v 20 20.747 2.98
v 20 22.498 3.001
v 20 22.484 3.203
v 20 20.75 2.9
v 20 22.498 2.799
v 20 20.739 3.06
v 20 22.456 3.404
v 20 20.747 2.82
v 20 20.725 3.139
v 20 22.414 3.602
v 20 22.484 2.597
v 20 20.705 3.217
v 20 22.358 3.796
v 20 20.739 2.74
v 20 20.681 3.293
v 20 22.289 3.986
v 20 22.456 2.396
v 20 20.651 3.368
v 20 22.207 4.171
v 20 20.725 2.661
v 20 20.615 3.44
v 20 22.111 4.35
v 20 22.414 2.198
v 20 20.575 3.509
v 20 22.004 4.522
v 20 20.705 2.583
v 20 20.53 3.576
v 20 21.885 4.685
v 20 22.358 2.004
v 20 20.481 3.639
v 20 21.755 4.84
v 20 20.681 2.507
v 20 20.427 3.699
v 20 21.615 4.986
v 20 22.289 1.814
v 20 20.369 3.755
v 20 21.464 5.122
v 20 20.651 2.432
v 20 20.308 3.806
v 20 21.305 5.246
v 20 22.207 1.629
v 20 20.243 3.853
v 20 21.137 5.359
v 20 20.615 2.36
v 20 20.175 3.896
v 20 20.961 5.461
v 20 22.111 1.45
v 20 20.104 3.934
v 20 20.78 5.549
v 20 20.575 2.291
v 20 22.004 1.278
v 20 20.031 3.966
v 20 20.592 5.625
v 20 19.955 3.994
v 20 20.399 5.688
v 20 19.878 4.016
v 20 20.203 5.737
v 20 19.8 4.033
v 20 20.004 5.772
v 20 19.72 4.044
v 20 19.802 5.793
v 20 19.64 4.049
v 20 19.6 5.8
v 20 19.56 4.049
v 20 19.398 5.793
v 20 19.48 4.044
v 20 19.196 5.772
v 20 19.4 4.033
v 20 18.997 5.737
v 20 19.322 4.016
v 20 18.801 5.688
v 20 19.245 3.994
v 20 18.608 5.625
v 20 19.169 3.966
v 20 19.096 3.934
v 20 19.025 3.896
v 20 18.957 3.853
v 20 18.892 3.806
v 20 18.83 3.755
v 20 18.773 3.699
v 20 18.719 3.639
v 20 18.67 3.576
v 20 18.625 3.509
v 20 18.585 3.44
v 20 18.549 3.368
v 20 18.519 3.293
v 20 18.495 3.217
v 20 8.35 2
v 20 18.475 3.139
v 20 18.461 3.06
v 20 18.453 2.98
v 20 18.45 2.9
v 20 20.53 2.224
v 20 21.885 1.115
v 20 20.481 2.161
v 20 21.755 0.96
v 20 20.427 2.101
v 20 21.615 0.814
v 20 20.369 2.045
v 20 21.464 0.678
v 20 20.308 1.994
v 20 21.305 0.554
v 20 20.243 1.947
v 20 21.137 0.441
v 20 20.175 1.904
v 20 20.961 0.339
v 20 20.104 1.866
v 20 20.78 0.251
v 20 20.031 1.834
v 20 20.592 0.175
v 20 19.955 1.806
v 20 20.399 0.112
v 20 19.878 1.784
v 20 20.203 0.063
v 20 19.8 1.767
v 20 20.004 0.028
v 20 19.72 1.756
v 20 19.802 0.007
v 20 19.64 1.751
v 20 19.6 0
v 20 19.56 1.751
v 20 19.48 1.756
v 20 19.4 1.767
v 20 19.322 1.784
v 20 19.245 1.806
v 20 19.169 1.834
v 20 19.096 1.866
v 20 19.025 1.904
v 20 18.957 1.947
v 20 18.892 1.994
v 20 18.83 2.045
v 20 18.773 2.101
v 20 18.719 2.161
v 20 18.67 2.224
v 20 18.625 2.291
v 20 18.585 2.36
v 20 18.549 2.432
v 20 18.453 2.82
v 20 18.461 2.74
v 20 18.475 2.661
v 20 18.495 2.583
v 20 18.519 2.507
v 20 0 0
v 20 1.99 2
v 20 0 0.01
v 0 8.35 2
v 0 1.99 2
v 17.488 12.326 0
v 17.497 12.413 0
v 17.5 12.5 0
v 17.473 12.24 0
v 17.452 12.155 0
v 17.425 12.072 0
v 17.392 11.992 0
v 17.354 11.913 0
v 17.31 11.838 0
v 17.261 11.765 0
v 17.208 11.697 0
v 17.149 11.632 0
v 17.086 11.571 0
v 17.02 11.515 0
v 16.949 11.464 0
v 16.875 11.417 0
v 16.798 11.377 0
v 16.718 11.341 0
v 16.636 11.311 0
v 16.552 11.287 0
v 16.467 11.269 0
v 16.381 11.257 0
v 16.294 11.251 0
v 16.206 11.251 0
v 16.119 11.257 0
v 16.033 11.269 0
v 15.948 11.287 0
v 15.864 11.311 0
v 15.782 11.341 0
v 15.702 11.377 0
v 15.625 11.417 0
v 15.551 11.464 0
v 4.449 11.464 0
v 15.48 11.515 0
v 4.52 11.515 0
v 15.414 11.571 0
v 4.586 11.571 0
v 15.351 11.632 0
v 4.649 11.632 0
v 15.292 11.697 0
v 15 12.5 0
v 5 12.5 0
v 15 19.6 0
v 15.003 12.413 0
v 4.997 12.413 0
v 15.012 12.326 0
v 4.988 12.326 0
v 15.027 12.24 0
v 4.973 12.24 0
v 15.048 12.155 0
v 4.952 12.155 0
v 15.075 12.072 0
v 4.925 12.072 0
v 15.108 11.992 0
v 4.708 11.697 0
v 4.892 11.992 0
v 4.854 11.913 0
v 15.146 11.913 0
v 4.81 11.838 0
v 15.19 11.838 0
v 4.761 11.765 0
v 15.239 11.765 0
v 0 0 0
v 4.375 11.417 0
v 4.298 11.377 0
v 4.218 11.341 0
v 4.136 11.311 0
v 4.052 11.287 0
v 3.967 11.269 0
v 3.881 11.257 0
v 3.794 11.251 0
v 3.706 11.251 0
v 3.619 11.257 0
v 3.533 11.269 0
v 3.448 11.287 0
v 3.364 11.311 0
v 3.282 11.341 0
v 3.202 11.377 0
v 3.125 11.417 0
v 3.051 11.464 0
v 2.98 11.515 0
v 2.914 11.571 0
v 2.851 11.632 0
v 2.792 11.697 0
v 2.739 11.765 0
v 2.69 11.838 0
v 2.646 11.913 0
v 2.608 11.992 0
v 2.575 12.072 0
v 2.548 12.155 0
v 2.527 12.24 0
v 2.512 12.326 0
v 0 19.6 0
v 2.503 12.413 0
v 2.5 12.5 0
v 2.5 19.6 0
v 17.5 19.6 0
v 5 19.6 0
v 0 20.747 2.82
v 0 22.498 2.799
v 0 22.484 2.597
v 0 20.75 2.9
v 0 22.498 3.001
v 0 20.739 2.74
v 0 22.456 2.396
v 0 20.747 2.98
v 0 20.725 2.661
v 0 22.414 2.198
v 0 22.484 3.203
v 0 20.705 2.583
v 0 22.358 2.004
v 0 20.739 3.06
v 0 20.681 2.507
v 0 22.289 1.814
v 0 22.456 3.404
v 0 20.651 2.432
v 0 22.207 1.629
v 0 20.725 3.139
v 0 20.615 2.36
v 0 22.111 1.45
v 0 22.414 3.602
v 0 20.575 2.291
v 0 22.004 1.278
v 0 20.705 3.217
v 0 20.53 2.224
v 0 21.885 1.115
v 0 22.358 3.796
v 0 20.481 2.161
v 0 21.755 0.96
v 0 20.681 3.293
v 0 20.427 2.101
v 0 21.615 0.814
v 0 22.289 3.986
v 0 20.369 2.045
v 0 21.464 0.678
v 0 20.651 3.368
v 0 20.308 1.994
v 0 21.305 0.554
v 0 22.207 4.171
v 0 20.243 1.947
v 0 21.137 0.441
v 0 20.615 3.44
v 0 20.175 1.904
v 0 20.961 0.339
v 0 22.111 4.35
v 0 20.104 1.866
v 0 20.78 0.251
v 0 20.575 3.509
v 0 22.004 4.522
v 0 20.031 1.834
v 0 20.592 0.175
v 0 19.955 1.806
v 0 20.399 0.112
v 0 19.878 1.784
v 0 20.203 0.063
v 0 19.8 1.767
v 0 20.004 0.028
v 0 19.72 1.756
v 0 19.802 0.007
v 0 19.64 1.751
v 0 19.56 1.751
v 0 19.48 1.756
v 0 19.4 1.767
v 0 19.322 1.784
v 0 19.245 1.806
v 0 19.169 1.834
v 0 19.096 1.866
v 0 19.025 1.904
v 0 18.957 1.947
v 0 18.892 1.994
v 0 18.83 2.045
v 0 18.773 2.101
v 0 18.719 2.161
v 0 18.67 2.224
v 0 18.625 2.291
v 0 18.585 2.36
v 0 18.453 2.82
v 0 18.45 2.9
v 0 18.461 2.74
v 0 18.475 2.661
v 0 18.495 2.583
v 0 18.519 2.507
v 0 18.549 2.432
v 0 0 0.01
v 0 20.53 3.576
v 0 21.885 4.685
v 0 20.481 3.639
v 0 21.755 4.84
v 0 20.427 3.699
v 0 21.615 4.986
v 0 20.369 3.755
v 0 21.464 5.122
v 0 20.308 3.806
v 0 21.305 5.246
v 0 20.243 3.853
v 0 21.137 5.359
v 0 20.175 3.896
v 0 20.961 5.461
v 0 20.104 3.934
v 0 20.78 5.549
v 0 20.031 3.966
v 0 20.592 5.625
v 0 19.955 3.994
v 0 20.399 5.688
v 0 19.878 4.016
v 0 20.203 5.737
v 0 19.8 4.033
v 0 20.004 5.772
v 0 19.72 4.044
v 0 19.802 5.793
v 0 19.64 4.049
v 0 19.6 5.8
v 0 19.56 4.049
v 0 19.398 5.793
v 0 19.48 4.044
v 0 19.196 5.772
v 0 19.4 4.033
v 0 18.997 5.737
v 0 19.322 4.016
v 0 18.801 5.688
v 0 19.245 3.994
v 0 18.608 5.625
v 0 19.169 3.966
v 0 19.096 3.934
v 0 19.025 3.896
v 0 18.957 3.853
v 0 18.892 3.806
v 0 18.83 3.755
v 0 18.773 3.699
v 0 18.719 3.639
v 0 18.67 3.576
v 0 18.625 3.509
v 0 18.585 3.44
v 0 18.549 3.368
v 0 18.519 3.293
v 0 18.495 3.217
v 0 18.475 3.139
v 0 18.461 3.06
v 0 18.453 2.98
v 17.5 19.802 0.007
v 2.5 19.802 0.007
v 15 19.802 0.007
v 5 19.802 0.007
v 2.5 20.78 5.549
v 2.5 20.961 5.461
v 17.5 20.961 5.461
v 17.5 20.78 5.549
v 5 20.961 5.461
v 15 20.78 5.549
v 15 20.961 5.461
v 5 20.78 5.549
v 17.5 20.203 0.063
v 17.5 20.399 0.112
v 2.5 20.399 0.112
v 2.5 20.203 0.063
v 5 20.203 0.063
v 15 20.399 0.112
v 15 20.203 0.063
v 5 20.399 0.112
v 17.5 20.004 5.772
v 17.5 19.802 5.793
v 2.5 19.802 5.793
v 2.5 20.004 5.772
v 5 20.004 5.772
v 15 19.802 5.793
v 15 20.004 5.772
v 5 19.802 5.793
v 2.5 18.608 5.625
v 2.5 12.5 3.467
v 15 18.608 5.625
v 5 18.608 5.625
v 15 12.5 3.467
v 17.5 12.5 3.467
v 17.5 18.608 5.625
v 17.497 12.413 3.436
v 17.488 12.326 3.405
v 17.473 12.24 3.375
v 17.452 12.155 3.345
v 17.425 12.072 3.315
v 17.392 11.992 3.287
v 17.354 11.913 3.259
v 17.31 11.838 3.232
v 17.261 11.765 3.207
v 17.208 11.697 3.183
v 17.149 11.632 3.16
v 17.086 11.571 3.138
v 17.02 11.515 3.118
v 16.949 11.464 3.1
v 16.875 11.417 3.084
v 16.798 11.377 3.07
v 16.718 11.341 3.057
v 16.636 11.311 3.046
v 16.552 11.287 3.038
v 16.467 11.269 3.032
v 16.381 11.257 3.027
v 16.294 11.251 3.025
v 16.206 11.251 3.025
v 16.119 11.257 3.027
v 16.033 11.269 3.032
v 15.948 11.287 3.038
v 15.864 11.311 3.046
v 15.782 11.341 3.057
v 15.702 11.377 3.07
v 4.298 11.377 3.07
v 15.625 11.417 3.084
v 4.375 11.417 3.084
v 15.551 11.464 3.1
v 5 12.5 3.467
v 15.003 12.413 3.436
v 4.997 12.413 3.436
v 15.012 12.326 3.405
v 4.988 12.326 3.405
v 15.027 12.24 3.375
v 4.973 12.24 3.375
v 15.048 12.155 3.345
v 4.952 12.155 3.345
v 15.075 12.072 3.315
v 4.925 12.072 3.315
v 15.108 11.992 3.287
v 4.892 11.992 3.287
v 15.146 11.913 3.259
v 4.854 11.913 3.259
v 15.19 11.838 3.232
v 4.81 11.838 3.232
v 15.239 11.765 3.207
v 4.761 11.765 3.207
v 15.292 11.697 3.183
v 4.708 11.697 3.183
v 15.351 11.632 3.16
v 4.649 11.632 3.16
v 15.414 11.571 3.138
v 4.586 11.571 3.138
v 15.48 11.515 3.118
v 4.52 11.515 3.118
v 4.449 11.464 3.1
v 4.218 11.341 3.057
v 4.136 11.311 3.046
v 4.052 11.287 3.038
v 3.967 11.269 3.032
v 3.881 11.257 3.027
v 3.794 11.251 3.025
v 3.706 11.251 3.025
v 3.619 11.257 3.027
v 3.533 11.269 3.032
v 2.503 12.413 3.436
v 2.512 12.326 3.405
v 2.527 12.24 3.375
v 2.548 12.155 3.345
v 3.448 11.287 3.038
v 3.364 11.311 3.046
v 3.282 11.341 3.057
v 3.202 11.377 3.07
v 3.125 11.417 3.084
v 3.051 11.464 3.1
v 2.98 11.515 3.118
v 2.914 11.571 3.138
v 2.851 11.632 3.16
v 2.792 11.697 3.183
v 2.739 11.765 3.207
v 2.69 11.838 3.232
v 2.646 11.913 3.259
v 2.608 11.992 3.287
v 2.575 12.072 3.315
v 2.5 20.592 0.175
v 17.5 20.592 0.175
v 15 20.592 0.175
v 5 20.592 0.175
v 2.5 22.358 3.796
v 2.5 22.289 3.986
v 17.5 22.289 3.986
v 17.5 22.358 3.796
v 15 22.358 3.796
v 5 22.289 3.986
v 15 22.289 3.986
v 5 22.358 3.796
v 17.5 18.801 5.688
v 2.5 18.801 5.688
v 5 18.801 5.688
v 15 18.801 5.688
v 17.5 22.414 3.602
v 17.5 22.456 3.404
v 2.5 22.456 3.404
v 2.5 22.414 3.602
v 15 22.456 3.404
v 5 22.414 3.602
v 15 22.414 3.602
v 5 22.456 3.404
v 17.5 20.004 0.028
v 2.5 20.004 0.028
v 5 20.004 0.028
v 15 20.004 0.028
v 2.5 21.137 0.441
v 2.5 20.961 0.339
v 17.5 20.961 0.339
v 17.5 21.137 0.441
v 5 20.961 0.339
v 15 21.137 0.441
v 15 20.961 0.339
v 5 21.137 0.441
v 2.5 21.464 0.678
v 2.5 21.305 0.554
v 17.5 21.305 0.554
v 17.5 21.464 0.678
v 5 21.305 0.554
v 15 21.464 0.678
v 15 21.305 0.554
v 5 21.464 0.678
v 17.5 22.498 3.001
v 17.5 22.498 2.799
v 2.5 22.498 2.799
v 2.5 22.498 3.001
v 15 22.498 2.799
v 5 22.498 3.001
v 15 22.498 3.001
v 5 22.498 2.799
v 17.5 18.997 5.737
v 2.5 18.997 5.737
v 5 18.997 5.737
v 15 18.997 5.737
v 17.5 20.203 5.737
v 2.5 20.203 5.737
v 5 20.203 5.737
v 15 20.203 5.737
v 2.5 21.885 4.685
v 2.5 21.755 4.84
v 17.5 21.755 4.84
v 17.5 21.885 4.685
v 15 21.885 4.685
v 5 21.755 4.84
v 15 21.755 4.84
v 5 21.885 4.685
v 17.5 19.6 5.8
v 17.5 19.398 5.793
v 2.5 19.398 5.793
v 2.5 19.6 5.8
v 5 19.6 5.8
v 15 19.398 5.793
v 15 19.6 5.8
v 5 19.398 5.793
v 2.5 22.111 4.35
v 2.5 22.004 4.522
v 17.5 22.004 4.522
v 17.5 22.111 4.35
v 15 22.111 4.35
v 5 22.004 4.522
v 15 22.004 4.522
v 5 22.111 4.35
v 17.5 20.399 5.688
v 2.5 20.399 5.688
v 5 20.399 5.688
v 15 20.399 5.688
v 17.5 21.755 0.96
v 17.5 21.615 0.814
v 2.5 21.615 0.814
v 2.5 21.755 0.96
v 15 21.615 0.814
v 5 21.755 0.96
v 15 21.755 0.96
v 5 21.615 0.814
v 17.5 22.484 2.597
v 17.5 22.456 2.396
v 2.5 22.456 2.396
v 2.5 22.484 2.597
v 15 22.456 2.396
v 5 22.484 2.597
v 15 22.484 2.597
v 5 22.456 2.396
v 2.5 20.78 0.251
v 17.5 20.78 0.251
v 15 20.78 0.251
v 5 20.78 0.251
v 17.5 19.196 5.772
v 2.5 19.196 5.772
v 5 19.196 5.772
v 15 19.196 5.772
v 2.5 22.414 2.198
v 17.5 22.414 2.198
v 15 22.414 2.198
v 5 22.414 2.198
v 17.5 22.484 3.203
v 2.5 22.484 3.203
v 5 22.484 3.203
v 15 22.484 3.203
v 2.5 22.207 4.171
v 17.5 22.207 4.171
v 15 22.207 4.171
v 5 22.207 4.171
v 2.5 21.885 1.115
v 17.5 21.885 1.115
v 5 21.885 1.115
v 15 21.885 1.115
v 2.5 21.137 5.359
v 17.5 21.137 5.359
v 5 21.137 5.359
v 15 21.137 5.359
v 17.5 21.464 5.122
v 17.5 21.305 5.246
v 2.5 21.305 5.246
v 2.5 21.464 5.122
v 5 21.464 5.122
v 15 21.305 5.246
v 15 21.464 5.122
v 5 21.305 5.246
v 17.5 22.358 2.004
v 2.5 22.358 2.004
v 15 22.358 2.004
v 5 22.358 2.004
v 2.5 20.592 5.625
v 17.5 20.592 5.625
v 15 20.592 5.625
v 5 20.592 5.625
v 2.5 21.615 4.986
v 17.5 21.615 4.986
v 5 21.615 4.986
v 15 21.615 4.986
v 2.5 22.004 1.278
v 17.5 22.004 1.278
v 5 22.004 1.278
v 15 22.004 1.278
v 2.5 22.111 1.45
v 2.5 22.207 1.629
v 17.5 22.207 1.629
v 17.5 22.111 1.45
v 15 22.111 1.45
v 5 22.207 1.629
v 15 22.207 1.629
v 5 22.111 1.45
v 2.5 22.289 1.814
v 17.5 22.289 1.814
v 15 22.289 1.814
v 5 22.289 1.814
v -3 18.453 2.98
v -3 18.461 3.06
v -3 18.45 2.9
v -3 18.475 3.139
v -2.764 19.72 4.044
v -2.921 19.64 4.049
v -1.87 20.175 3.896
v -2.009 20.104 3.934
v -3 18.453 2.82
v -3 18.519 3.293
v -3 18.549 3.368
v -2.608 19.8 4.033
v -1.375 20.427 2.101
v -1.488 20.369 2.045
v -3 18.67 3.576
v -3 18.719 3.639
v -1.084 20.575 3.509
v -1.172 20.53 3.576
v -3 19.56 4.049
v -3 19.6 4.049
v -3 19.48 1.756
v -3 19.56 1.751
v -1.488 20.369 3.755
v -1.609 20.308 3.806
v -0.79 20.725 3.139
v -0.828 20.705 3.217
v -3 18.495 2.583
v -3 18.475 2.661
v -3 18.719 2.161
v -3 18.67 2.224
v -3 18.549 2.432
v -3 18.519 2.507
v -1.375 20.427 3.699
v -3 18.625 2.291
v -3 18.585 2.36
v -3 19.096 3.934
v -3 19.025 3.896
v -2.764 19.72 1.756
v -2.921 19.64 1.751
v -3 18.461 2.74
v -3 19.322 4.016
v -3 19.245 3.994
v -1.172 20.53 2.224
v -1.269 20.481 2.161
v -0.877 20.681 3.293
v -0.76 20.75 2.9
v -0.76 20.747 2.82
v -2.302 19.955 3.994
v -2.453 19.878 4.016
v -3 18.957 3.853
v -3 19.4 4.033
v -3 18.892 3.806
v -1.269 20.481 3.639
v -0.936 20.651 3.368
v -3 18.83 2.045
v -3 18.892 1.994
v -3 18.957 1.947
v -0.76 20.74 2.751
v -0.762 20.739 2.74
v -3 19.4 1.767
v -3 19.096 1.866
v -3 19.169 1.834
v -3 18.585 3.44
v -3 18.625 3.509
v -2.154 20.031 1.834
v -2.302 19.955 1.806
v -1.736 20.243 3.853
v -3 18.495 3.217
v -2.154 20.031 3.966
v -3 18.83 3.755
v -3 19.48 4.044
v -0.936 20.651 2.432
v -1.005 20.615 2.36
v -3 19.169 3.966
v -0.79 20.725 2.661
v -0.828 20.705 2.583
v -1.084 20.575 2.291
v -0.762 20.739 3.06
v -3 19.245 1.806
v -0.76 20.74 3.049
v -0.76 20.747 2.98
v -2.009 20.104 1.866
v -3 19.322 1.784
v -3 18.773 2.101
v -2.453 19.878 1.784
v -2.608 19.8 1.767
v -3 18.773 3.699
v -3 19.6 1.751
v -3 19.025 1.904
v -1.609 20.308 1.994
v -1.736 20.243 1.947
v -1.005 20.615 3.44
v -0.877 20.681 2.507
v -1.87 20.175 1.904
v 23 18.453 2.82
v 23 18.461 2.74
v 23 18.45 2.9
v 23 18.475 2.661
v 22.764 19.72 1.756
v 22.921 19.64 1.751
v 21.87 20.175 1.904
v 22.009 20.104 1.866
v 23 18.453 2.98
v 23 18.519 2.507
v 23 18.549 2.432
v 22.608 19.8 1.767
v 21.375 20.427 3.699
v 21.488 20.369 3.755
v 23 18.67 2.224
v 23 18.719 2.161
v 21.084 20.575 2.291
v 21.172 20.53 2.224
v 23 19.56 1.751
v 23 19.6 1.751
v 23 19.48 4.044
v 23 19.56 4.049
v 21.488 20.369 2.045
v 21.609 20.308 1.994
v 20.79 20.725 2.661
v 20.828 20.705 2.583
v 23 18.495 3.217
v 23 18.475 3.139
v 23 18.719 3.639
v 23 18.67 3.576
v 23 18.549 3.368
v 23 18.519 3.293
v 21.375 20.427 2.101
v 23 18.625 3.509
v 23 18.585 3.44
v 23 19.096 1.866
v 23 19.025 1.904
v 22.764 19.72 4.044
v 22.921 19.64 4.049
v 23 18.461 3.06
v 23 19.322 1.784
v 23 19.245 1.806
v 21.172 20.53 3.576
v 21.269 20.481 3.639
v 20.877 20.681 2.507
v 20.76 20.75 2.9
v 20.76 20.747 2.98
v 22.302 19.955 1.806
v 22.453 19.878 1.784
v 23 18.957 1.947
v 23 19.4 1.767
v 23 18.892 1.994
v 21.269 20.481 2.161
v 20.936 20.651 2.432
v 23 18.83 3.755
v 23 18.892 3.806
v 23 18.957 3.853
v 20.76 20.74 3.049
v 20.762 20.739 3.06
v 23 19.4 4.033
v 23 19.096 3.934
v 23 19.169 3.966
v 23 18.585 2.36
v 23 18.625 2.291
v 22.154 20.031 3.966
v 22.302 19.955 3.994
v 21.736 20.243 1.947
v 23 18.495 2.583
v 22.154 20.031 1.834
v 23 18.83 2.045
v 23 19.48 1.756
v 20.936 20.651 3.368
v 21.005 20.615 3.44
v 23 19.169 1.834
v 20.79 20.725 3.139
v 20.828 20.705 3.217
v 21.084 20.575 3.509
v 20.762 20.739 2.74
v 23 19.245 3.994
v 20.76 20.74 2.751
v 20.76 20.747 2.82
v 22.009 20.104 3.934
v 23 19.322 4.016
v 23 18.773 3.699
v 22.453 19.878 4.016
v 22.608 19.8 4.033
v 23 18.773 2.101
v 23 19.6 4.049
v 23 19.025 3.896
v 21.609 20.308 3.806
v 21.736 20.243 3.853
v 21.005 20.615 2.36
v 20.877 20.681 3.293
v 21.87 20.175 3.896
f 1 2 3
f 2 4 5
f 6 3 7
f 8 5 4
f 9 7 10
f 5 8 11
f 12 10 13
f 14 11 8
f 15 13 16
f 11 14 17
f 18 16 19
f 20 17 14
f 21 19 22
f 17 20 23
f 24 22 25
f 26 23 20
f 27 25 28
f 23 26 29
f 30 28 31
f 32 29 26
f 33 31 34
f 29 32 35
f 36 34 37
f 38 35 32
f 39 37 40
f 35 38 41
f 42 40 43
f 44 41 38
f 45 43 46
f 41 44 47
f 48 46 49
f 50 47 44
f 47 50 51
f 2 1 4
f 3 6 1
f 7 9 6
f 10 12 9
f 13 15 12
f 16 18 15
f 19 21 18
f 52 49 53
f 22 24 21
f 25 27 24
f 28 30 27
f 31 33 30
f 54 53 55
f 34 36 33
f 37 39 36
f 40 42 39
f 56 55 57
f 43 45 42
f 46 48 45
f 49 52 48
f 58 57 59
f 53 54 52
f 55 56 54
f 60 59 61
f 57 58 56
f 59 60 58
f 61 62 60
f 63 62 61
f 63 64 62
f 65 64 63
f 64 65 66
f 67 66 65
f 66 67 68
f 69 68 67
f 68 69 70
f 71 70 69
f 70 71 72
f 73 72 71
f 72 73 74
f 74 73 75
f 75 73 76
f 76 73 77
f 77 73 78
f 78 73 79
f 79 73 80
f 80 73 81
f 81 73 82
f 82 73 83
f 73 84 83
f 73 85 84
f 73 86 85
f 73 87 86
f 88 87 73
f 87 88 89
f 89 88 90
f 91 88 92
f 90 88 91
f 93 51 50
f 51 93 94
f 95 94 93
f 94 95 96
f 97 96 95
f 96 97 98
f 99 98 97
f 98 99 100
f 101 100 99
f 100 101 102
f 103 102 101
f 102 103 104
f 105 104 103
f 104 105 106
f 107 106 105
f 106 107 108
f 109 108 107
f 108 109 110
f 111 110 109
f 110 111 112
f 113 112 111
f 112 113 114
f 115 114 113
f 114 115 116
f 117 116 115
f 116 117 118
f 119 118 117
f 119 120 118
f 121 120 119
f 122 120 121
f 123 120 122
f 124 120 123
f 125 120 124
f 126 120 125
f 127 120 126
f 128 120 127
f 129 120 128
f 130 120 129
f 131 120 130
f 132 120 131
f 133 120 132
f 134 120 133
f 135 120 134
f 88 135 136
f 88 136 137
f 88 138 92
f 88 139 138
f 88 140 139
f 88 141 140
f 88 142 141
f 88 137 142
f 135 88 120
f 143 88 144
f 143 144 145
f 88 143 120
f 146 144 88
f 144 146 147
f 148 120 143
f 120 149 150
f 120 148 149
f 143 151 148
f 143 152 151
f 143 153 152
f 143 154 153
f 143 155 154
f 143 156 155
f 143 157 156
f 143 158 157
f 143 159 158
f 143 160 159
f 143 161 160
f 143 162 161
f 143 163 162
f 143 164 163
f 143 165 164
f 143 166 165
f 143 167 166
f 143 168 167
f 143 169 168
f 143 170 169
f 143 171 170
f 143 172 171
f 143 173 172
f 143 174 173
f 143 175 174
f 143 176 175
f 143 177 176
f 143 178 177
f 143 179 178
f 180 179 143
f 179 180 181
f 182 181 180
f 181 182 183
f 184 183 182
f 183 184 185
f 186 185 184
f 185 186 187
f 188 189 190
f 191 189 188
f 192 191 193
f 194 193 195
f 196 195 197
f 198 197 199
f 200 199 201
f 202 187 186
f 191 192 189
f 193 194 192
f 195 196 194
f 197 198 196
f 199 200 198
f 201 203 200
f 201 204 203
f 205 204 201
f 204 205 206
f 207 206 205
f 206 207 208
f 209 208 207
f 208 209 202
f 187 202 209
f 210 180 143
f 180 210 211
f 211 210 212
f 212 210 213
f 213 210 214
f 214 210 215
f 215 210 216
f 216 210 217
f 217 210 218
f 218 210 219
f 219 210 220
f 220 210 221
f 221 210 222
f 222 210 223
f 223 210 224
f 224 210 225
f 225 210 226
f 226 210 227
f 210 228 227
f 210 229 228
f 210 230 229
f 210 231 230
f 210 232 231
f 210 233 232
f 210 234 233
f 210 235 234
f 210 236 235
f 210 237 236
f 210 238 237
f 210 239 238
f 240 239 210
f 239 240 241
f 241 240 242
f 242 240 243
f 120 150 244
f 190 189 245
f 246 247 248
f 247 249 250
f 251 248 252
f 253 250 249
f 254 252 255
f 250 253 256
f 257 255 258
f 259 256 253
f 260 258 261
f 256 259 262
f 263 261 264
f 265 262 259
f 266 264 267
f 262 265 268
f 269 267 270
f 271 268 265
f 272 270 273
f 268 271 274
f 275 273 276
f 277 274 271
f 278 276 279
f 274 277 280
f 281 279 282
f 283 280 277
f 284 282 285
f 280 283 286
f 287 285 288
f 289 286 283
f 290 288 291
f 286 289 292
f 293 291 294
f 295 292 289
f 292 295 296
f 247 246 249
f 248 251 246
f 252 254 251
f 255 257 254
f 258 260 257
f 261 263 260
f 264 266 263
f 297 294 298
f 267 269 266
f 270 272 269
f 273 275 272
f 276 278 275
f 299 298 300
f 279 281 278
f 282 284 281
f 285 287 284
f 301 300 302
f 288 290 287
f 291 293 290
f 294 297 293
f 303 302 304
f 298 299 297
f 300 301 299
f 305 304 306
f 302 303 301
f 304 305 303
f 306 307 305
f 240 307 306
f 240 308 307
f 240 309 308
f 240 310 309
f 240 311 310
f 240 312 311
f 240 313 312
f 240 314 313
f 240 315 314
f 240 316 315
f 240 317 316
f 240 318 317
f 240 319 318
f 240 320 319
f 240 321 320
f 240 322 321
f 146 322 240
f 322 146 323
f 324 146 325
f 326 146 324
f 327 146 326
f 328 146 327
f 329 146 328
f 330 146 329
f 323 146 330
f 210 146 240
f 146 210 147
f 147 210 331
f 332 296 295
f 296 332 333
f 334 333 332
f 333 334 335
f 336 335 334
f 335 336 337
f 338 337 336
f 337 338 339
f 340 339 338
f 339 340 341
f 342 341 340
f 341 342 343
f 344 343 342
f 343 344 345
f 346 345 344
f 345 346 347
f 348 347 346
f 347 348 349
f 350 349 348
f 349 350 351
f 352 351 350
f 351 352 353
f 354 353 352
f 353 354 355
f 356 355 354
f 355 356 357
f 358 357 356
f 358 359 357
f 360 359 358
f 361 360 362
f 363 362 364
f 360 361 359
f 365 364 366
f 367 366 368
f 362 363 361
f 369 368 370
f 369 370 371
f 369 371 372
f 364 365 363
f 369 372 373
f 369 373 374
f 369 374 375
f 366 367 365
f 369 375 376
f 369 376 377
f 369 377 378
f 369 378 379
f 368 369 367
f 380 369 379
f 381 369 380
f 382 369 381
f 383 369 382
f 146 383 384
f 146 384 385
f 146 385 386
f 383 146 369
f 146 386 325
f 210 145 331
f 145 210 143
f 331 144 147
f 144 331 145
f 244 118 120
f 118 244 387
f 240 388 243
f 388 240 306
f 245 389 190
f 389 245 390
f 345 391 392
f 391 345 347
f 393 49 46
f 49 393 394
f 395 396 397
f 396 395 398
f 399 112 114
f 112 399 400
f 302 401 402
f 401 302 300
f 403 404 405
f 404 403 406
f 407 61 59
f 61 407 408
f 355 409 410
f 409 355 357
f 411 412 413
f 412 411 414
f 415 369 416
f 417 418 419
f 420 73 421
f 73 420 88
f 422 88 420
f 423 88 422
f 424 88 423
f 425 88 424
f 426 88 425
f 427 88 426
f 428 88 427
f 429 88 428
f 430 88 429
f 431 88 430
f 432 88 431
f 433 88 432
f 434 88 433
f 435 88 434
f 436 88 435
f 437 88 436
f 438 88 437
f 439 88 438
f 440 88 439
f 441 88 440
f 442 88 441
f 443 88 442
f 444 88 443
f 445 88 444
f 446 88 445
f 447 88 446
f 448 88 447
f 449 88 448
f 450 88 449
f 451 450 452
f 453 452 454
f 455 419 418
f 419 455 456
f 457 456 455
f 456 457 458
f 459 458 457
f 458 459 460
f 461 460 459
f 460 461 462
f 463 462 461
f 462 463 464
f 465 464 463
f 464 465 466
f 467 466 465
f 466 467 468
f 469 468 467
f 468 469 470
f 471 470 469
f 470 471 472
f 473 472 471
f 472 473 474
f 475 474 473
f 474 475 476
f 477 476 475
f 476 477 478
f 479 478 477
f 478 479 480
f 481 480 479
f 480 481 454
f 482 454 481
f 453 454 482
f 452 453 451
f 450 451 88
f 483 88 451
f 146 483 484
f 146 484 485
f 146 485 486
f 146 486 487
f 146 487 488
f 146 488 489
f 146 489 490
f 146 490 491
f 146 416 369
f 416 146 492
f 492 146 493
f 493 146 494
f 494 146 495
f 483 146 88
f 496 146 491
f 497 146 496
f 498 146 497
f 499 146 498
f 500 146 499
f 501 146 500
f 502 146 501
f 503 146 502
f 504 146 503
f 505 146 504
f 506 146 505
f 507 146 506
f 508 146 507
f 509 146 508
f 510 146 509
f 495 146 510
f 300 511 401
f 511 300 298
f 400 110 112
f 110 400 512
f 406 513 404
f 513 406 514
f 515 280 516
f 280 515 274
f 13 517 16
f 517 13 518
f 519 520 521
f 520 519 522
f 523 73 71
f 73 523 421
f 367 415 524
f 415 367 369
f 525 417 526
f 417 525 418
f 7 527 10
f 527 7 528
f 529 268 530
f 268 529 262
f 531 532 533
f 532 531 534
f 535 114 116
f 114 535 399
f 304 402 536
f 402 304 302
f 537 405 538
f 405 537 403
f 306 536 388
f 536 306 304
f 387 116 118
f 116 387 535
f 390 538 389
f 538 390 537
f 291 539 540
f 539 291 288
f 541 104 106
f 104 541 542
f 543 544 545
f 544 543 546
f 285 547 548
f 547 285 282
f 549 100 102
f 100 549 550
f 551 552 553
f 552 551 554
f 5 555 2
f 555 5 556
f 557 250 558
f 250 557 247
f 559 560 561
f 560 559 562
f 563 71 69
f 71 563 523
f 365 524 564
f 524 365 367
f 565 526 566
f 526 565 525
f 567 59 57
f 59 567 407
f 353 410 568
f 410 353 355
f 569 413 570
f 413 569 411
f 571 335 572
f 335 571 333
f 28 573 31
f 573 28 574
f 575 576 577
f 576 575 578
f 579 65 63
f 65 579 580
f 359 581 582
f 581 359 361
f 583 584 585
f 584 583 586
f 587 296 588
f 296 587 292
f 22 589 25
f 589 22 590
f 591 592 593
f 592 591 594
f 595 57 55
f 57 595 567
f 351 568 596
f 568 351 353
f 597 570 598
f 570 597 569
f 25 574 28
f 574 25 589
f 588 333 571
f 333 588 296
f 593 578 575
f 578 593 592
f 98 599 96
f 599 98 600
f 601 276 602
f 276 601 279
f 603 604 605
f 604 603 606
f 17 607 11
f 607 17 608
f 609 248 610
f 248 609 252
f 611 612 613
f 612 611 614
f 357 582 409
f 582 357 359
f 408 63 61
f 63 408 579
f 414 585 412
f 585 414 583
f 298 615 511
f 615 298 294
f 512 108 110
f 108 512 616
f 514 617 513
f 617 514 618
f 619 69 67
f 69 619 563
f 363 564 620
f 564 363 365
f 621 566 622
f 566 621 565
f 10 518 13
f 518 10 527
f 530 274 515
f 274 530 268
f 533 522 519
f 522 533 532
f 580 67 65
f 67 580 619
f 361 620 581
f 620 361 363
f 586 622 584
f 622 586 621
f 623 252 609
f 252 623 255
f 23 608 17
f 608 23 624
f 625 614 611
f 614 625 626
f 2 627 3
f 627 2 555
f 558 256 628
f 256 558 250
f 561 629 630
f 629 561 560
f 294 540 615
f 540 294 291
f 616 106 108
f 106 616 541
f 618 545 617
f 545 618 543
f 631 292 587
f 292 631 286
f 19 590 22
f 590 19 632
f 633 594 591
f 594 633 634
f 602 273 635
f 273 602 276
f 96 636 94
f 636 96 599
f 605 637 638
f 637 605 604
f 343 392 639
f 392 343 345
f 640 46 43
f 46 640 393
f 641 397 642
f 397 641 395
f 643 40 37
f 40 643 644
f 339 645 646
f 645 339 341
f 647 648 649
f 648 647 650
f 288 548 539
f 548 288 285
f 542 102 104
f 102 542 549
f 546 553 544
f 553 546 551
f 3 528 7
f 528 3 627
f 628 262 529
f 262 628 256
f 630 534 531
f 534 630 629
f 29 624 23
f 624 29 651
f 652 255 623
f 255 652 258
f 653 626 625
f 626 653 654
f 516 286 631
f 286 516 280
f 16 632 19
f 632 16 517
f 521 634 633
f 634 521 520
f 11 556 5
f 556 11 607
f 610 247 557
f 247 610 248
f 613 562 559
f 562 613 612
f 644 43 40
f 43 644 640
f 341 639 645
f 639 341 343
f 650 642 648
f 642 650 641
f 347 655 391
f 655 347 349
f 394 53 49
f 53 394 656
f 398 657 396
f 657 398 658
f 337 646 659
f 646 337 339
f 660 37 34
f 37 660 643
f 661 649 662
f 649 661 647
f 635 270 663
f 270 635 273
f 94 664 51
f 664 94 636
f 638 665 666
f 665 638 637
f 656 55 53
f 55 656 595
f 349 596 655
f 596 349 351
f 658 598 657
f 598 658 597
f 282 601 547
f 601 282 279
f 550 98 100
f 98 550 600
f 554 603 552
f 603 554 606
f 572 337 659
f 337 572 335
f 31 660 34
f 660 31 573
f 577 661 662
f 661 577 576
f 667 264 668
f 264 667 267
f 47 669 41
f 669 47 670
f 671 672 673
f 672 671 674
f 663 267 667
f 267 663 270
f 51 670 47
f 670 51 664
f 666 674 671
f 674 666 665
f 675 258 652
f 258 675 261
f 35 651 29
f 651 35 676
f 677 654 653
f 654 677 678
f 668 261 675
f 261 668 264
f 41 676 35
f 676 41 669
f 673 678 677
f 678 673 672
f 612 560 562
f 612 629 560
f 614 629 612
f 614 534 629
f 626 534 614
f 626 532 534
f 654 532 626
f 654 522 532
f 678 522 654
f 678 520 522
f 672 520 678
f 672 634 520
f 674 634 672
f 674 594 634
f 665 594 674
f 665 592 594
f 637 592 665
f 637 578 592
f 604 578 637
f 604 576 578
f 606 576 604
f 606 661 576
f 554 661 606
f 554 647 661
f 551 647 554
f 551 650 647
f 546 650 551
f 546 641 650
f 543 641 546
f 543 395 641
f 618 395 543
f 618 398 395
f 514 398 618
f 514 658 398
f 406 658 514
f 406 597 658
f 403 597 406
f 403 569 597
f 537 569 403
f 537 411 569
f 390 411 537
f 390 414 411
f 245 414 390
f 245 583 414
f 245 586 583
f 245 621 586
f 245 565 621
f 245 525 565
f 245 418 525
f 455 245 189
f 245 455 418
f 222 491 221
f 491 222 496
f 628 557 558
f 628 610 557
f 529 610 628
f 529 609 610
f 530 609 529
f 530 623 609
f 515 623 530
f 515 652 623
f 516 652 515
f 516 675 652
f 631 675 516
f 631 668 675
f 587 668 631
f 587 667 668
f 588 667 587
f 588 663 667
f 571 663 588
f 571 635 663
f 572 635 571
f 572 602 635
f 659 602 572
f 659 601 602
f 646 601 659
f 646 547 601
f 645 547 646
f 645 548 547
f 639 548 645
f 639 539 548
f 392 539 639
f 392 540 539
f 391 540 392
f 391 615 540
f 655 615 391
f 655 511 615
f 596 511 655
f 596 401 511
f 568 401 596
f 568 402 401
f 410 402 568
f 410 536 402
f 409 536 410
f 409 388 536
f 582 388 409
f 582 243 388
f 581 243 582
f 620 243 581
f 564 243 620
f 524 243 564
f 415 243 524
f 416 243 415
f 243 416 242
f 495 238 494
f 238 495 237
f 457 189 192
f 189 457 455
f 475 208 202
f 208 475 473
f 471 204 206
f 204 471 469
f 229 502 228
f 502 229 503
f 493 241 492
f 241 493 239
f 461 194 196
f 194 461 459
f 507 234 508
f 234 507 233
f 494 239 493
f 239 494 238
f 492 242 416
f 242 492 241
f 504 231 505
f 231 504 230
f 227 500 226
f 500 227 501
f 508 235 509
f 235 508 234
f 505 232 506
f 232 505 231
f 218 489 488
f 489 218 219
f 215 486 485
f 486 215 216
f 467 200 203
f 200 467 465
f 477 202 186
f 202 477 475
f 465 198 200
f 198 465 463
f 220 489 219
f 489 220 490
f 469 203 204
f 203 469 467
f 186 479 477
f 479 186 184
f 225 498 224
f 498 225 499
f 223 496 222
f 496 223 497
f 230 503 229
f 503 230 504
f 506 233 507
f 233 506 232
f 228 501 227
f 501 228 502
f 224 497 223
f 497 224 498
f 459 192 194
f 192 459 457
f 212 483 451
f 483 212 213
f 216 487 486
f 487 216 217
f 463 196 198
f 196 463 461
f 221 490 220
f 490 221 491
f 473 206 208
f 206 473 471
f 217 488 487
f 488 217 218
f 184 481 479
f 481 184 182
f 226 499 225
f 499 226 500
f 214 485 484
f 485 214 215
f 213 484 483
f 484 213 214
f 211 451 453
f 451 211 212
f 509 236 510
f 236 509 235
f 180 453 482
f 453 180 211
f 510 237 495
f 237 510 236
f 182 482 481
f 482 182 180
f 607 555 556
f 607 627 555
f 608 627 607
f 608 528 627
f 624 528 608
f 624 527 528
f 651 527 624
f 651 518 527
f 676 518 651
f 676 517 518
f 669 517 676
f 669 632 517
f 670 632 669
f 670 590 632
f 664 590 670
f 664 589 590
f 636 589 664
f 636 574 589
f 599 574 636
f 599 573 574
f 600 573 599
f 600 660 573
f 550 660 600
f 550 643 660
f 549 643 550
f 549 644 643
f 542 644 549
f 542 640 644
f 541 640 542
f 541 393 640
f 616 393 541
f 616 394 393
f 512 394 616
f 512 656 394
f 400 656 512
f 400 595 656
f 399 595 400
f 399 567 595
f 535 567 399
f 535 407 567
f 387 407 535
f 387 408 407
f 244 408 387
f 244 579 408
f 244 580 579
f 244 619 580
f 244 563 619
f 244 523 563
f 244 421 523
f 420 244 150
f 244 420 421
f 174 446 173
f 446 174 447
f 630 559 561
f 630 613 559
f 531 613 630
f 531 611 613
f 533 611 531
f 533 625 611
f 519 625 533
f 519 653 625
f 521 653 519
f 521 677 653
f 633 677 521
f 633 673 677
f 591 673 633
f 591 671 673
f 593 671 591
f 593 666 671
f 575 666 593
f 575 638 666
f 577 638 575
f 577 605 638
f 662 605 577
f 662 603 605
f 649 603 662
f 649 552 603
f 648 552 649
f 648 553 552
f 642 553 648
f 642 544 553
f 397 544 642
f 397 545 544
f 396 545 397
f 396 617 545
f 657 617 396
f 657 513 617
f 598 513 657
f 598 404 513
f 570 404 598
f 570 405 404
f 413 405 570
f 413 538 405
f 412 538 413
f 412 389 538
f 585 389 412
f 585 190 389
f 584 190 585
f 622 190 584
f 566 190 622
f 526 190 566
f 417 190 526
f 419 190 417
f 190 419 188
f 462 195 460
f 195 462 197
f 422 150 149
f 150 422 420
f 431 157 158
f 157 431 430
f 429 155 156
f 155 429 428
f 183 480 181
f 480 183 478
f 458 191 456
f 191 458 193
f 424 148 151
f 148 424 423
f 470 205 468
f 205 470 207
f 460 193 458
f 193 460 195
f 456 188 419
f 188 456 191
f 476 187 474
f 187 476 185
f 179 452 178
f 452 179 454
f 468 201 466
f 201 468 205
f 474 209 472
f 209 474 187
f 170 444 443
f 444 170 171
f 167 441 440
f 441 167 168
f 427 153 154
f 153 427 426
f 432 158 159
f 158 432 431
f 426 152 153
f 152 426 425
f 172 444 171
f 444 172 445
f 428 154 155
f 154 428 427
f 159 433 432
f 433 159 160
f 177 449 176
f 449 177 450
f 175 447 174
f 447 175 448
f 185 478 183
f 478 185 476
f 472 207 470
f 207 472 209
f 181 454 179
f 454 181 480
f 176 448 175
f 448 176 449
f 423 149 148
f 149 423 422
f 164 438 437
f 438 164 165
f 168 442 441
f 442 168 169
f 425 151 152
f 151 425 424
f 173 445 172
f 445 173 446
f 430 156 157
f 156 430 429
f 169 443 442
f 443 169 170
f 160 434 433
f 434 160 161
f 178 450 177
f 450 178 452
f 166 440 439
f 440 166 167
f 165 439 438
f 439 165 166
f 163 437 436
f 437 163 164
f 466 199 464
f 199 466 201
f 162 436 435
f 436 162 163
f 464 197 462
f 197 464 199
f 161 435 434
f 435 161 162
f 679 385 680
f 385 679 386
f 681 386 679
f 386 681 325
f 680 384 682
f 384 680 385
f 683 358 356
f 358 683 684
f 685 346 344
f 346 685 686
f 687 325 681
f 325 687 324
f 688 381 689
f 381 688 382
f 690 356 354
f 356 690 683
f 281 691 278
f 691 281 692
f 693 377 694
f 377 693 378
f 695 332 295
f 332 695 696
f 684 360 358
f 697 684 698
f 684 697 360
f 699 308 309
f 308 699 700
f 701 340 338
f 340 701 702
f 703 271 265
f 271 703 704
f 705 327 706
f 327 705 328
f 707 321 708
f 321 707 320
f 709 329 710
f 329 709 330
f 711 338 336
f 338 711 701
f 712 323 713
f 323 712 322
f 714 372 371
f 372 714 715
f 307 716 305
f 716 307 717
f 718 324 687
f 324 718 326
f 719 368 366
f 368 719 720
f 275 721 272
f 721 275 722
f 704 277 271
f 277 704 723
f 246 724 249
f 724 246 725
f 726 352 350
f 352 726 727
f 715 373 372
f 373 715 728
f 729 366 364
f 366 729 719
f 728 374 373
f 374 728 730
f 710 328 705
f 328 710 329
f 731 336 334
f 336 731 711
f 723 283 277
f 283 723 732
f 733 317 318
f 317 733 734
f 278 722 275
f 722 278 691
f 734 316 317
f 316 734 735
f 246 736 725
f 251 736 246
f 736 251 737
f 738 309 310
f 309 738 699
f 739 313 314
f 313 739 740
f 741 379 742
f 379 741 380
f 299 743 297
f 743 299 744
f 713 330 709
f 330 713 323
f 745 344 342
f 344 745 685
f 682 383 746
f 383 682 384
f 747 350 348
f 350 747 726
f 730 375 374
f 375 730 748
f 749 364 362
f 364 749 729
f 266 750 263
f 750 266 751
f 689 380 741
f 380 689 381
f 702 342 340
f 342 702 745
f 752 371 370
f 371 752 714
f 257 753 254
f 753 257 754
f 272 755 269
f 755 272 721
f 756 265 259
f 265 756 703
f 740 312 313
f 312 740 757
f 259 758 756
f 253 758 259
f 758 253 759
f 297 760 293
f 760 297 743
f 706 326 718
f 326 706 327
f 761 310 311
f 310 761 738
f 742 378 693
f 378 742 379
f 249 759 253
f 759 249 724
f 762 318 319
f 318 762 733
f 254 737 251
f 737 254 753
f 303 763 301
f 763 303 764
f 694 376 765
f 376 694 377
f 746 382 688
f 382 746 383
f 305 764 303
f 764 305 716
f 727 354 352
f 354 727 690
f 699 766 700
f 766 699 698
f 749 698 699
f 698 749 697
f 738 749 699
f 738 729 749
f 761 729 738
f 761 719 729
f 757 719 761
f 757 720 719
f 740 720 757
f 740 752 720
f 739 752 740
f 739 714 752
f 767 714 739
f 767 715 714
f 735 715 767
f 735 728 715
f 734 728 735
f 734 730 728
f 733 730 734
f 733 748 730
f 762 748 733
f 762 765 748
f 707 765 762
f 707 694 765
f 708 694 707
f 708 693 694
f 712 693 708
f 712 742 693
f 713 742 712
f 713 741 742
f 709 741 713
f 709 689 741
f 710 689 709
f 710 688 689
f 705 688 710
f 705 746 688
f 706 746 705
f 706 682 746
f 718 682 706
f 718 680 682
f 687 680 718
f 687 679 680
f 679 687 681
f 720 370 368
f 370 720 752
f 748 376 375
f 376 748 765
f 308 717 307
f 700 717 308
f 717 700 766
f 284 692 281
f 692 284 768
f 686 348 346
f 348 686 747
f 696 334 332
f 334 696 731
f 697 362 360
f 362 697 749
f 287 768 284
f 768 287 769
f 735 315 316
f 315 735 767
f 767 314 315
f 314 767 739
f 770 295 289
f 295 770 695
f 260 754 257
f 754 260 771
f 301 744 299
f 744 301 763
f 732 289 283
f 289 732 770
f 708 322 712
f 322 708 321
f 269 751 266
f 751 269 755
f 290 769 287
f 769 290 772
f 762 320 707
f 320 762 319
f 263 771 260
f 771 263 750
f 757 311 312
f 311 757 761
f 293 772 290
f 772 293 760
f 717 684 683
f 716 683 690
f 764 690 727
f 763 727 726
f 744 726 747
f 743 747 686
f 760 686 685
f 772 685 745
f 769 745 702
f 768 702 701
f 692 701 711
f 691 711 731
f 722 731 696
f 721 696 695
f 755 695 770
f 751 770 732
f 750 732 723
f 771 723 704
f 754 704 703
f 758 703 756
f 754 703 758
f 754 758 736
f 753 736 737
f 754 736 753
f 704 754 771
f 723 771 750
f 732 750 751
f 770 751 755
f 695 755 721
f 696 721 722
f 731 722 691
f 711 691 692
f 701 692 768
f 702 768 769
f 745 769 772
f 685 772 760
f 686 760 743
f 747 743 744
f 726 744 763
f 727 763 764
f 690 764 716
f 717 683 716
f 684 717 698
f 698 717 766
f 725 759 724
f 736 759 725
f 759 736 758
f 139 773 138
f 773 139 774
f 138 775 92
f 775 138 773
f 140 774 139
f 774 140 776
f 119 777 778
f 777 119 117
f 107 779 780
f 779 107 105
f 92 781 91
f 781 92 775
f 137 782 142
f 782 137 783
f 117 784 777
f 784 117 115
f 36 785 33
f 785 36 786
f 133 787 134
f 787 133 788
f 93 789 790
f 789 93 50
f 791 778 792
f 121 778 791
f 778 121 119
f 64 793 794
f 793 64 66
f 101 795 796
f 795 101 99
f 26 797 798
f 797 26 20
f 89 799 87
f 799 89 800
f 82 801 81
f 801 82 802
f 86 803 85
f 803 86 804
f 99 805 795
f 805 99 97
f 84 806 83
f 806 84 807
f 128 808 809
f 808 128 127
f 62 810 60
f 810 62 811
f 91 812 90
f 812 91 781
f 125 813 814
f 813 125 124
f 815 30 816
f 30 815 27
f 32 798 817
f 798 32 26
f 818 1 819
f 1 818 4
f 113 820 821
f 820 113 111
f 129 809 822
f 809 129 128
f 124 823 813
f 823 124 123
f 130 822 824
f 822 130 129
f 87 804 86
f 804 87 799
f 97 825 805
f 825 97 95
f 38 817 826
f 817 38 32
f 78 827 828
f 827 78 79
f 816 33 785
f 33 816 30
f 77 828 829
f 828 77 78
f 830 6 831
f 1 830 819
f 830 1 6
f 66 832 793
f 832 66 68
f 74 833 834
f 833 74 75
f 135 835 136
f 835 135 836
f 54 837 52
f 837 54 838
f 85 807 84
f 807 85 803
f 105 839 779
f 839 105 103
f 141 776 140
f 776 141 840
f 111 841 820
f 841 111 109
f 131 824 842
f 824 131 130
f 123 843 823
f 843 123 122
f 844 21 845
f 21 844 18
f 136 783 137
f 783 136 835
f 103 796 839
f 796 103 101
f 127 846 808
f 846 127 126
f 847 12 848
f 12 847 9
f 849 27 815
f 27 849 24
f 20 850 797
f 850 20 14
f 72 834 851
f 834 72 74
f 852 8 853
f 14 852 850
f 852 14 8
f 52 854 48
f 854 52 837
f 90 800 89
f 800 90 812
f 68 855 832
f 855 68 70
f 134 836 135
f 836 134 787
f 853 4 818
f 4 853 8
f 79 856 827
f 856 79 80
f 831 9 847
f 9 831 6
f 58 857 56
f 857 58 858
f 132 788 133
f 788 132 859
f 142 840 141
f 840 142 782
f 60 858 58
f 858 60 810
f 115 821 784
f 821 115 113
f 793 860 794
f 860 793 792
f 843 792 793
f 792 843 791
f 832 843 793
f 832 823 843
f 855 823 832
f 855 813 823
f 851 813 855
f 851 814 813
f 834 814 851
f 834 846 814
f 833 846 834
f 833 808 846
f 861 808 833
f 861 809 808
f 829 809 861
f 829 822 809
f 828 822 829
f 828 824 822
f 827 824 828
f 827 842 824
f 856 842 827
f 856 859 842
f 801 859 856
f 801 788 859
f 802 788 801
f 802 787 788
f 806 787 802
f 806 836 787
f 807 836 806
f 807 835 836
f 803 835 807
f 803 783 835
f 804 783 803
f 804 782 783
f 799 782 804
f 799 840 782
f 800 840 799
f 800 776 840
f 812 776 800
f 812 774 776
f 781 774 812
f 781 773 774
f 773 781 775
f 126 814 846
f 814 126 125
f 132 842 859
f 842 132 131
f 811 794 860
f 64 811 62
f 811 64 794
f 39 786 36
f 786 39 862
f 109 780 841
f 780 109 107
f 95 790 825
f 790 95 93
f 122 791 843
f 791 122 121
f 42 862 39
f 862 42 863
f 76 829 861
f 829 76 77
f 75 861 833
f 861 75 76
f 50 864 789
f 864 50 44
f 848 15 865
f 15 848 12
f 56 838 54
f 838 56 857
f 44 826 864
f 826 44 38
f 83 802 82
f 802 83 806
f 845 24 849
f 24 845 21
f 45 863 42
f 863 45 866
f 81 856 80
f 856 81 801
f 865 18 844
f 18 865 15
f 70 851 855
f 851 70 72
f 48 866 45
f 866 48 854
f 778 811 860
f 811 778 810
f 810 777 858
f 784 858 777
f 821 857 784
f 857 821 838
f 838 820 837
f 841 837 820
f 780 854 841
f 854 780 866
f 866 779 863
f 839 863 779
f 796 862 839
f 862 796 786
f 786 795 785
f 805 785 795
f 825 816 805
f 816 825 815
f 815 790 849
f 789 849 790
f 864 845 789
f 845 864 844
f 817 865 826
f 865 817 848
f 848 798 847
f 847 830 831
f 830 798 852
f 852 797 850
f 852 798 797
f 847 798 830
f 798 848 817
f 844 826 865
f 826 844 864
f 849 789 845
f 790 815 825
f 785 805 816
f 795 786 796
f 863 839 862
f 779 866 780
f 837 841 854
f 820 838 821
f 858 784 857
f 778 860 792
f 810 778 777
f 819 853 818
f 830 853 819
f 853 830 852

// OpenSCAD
// general purpose parameters
eps = 0.01;
$fn = 90;

// main shape parameters
kl_d = 5.8;
kl_x = 20;
kl_y = 22.5;
kl_t = 2;

// cut parameters
// cut width
c_w = 2.5;
// cut lenfth
c_l = 10;

// hinge parameters
h_h = 3;
h_d = 2.3;

module cut()
{
    hull()
    {
        cylinder(h=kl_d+2*eps,d=c_w);
        translate([0,c_l,0])
            cylinder(h=kl_d+2*eps,d=c_w);
    }
}
    

module hinge()
{
    difference()
    {
        cylinder(d=h_d,h=h_h);
        translate([-h_d/2,-h_d/2,h_h/4+eps])
        hull()
        {
            cube([eps,h_d,3*h_h/4]);
            translate([0,0,3*h_h/4-eps])
                cube([h_d/2,h_d,eps]);
        }
    }
}


module keyboard_leg()
{
    difference()
    {
        union()
        {
            // main shape
            translate([0,kl_t,0])
                cube([kl_x,kl_y-kl_t-kl_d/2,kl_t]);
            // front slope
            hull()
            {
                cube([kl_x,kl_t,eps]);
                translate([0,kl_t-eps,0])
                    cube([kl_x,eps,kl_t]);
            }
            // back area
            hull()
            {
                translate([0,kl_y-kl_d/2,kl_d/2])
                    rotate([0,90,0])
                        cylinder(d=kl_d,h=kl_x);
                translate([0,kl_y/2-kl_d/2,0])
                    cube([kl_x,kl_y/2-kl_d/2,kl_t]);
            }
        }
        
        // springing cut
        translate([1.5*c_w,kl_y-c_l,-eps])
            cut();
        translate([kl_x-1.5*c_w,kl_y-c_l,-eps])
            cut();
            
    }
    // adding side cylinders
    translate([0,kl_y-kl_d/2,kl_d/2])
        rotate([90,0,-90])
            hinge();
    
    translate([kl_x,kl_y-kl_d/2,kl_d/2])
        rotate([-90,0,-90])
            hinge();

    
}

keyboard_leg();
